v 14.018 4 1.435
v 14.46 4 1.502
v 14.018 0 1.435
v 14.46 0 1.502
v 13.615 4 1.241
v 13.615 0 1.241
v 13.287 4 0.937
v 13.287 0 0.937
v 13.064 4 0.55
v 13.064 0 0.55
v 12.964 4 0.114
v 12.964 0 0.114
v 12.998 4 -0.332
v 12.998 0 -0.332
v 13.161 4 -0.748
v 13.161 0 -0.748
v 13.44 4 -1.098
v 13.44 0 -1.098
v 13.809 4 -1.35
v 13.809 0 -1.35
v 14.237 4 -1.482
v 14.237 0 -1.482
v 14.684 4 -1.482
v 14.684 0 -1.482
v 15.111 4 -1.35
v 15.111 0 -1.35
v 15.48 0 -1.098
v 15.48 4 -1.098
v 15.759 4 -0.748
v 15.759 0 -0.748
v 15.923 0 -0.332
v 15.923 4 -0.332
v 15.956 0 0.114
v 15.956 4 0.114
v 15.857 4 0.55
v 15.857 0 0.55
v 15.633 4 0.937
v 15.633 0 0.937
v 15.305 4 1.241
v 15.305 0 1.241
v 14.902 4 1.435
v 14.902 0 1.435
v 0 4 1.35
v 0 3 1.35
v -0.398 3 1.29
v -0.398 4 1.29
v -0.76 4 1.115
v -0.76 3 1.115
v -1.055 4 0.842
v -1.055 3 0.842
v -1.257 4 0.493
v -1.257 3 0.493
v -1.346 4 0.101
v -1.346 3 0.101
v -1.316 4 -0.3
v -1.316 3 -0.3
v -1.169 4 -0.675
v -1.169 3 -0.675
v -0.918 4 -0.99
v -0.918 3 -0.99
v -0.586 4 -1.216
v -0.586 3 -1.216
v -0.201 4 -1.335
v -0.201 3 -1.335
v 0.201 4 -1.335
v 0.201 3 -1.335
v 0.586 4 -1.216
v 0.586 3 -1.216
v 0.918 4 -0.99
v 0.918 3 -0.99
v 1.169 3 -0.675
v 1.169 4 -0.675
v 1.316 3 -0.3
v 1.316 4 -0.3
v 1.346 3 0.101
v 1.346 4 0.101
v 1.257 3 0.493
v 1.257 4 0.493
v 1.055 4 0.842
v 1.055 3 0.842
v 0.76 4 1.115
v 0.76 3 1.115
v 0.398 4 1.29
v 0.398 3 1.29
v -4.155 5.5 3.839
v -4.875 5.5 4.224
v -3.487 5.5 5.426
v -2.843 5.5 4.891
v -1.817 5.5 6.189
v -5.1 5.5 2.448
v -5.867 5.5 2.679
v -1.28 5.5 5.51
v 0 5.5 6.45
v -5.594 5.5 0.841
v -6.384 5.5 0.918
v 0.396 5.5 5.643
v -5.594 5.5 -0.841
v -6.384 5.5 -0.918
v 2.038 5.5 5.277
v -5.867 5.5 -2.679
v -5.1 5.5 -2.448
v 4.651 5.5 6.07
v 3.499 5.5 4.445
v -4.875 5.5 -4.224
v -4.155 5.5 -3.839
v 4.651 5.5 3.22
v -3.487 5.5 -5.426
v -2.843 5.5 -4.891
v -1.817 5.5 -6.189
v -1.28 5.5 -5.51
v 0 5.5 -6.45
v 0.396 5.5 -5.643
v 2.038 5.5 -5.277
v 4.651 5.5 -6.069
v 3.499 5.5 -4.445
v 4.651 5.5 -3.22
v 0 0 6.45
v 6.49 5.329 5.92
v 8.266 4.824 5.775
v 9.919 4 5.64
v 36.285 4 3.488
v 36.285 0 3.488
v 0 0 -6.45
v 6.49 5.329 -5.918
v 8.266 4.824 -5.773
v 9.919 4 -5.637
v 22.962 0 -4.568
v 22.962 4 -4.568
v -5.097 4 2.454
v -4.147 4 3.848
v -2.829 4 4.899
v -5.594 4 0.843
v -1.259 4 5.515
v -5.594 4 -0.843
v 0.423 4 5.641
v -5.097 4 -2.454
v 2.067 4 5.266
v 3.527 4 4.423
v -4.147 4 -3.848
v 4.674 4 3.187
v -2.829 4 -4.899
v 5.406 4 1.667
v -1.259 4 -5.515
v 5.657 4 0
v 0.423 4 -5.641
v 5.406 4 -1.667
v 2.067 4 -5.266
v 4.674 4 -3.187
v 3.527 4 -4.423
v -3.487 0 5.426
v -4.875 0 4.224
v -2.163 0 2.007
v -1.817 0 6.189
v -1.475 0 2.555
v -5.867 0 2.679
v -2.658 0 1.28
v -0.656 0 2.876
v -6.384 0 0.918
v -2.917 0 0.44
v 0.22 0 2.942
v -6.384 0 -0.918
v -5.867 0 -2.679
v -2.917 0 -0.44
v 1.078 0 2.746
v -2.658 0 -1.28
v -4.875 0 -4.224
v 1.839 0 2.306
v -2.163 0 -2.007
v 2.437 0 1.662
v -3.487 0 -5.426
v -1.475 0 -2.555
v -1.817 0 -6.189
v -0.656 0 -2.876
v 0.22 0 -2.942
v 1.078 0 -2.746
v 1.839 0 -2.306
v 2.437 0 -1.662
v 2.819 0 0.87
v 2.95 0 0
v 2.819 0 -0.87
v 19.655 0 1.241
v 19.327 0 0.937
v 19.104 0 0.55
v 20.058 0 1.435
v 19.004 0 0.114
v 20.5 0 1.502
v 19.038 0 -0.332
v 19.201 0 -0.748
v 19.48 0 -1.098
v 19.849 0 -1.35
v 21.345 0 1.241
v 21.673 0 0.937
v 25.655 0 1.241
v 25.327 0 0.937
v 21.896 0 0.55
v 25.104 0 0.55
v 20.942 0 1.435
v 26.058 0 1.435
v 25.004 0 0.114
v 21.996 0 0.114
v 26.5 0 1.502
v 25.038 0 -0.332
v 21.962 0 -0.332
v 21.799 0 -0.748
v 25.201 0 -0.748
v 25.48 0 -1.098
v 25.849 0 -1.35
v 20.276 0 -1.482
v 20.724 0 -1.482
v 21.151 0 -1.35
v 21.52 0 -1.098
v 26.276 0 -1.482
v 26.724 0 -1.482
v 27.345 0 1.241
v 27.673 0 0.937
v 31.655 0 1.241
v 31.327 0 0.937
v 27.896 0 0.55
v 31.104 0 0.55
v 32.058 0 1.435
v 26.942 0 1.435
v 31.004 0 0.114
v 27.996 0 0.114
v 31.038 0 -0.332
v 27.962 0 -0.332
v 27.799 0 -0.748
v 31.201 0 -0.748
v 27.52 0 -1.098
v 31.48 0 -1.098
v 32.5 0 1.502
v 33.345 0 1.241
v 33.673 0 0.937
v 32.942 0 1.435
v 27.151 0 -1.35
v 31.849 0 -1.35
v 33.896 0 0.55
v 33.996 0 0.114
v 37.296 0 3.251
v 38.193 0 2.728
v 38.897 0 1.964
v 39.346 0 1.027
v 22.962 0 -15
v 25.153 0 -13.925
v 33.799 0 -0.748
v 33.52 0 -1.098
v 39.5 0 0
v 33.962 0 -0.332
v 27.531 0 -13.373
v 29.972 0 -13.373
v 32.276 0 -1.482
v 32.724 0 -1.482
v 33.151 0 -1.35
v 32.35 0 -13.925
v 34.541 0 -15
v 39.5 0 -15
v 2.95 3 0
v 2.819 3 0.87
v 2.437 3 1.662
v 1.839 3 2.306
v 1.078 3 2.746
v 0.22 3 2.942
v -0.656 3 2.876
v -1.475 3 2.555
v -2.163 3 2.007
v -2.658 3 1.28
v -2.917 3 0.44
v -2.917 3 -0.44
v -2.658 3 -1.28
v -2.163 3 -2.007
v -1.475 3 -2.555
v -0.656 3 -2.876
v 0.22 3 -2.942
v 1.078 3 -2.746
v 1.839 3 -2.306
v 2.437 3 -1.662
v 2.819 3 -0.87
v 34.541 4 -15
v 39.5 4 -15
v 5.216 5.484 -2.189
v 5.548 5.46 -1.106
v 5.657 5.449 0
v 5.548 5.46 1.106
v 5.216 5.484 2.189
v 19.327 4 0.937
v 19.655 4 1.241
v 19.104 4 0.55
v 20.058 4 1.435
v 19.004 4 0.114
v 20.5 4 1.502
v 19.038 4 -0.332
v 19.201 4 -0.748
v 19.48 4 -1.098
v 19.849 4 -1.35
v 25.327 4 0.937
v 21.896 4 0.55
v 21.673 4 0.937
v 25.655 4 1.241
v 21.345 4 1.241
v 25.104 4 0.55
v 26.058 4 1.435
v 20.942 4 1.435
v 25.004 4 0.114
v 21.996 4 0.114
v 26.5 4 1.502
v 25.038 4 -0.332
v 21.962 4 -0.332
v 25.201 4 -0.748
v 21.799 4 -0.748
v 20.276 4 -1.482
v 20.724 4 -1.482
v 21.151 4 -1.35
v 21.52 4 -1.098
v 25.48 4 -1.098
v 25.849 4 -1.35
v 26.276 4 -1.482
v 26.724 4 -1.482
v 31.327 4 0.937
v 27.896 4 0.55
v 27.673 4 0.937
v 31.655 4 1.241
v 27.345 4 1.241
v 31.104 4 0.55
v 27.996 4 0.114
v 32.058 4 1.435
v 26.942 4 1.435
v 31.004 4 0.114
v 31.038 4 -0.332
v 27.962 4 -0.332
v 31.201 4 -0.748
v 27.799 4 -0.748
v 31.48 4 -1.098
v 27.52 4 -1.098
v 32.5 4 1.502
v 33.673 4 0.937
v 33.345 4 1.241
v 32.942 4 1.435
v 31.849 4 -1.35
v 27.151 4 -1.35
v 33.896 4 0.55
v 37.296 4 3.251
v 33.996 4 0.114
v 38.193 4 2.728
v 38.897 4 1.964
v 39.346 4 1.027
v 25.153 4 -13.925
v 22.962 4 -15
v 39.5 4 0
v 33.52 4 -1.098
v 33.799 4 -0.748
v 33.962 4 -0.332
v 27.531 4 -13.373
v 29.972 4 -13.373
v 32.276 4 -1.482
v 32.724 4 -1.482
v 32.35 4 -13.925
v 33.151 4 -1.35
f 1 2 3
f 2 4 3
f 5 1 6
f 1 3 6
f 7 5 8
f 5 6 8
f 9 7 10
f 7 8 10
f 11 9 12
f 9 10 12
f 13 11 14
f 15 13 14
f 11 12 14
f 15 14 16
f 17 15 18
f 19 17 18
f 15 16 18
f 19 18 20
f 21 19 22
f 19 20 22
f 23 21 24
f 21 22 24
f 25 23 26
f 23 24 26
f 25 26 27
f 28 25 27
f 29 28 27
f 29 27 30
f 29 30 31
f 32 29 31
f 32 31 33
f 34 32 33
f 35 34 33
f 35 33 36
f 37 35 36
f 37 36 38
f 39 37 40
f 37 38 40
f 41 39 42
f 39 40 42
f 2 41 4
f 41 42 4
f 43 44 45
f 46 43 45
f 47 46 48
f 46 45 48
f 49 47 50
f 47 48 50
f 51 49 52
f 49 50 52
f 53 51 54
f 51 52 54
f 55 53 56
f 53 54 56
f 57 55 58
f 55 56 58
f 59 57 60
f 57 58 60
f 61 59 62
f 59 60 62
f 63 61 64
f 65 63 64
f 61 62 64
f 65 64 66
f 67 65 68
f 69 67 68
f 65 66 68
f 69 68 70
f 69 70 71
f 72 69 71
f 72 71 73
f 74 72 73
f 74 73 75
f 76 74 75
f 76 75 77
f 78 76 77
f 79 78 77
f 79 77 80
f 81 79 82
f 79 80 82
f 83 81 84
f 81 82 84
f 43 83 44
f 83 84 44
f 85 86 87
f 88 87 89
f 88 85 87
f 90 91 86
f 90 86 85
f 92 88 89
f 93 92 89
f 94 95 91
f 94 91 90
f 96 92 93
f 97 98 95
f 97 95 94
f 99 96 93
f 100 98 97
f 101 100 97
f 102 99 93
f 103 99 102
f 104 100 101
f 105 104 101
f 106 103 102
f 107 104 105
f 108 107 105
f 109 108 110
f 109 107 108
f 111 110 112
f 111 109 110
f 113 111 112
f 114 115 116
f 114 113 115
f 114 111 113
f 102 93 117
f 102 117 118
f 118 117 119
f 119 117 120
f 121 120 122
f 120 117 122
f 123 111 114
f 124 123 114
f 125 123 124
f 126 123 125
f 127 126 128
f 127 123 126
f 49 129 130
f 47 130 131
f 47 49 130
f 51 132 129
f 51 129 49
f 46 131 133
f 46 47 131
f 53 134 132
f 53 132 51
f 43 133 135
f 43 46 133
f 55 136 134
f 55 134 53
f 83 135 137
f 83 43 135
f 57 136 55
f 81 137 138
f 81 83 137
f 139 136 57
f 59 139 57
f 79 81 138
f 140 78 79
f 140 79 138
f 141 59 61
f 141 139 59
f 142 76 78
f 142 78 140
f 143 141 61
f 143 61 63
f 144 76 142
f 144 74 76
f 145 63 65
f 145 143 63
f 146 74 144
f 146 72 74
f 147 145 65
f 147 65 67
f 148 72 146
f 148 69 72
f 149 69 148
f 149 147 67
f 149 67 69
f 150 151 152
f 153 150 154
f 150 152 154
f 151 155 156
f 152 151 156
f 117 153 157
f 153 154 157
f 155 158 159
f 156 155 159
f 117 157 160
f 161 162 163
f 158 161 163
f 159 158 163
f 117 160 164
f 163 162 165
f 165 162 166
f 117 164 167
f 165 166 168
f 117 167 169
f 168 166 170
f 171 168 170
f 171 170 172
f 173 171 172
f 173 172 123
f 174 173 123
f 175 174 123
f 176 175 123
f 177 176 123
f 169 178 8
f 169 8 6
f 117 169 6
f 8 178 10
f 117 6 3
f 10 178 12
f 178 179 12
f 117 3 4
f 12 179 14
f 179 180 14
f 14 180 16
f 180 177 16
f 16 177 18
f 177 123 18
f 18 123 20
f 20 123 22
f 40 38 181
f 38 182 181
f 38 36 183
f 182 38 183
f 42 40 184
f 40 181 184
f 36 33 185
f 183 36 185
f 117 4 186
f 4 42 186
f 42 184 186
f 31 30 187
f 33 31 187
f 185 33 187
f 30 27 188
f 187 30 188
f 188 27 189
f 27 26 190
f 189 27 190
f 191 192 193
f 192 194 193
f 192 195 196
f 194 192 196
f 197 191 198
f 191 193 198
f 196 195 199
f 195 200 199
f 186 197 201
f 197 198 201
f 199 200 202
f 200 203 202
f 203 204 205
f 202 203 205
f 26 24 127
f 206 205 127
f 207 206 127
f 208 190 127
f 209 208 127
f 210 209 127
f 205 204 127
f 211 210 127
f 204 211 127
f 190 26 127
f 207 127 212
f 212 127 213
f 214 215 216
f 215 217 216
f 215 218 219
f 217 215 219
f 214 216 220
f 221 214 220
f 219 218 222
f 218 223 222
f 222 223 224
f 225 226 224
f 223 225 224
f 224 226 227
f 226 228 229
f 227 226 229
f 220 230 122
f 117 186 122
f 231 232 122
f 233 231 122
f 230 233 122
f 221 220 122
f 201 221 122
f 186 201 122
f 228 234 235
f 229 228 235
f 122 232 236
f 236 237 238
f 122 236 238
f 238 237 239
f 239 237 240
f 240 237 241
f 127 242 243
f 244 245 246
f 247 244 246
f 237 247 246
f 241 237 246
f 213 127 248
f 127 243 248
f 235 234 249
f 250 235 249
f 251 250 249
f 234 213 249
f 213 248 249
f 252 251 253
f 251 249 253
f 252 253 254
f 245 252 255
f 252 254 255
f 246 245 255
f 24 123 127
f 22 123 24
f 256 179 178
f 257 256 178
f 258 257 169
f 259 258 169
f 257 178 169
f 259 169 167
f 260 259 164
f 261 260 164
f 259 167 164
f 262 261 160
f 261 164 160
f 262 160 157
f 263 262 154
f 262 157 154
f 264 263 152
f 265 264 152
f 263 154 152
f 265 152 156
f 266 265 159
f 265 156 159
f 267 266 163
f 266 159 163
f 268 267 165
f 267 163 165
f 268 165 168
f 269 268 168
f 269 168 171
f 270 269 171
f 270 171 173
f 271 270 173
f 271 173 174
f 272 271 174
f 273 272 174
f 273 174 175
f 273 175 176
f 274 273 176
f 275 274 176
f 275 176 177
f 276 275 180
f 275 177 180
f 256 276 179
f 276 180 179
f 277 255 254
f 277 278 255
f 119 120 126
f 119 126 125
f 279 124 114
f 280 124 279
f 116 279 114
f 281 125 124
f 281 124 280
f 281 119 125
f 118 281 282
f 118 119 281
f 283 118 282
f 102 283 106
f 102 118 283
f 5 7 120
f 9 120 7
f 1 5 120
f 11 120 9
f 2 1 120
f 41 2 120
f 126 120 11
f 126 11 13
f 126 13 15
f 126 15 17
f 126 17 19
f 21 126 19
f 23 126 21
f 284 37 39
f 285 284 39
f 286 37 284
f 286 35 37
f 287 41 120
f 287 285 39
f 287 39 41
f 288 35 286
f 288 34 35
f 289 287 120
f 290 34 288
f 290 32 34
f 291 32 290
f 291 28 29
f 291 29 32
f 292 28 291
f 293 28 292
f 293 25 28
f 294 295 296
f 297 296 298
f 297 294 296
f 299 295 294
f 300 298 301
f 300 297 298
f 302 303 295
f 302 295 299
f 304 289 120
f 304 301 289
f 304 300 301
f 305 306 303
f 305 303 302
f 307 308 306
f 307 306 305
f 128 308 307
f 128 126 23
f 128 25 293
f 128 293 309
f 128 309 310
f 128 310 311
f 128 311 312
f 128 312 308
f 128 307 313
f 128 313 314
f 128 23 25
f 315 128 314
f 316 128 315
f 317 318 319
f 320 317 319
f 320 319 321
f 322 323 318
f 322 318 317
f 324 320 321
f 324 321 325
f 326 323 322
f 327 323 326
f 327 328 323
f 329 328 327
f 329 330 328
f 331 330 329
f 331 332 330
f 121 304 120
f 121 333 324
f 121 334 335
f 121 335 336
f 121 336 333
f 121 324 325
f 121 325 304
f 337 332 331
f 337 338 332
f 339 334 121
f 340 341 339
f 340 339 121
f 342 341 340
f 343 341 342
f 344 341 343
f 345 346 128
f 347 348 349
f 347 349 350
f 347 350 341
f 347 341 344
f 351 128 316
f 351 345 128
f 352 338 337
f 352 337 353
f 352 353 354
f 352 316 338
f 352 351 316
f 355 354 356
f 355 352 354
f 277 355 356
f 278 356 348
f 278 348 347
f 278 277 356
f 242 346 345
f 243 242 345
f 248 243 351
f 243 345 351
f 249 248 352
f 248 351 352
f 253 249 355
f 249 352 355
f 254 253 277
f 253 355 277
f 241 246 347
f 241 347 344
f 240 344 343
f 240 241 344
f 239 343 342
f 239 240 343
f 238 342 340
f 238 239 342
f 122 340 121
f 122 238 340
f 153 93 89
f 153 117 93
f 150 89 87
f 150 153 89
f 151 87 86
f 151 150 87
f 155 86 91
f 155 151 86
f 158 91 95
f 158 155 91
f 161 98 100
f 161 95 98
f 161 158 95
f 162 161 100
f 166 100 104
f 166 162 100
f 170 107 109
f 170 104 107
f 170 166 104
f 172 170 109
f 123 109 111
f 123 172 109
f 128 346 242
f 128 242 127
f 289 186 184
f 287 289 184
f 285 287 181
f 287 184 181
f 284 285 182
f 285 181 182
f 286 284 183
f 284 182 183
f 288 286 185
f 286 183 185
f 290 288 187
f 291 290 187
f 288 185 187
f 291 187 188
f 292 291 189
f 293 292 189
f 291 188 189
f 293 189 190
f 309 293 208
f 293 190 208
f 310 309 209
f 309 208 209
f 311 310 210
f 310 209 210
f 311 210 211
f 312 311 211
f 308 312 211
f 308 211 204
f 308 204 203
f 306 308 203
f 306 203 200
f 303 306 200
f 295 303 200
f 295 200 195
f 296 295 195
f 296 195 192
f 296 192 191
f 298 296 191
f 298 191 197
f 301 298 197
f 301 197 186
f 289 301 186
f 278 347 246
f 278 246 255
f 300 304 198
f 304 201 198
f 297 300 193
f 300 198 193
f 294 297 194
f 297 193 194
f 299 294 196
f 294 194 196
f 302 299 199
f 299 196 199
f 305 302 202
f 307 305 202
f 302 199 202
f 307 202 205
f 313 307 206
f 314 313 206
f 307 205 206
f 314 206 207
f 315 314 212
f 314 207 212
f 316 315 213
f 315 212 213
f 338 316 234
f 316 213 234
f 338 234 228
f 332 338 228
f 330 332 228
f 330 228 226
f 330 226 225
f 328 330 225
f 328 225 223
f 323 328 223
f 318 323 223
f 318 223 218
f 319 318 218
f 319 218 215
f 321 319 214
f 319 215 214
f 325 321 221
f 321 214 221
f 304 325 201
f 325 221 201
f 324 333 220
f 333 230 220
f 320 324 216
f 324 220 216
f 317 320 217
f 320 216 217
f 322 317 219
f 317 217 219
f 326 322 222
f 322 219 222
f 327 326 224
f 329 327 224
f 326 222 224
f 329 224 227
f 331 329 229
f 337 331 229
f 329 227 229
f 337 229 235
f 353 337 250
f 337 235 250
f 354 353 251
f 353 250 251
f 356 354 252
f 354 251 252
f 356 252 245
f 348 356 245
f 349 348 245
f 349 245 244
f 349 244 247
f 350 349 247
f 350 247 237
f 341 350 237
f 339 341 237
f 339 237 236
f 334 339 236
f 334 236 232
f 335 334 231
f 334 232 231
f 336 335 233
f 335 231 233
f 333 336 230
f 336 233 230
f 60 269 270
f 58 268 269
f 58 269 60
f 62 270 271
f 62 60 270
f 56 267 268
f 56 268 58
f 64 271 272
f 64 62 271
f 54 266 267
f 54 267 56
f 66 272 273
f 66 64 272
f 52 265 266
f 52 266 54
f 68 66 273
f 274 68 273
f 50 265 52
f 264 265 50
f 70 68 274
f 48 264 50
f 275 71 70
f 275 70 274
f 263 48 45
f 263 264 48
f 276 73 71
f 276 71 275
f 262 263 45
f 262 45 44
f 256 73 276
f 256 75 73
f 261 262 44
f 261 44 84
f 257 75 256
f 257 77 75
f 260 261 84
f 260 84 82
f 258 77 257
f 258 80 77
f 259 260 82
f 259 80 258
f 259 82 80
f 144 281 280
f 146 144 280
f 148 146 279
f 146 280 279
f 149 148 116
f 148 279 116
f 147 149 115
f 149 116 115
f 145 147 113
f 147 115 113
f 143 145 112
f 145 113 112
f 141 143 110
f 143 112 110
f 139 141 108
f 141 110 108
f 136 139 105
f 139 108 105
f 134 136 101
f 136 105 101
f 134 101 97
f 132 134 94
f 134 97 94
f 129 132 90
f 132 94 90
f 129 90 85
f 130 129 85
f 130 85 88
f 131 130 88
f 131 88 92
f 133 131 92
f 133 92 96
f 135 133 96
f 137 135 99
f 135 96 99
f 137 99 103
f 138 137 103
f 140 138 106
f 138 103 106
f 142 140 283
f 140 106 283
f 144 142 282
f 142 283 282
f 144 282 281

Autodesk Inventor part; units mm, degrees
ref_plane "YZ Plane" through (0, 0, 0) normal (1, 0, 0) x (0, 1, 0)
ref_plane "XZ Plane" through (0, 0, 0) normal (0, 1, 0) x (-1, 0, 0)
ref_plane "XY Plane" through (0, 0, 0) normal (0, 0, 1) x (1, 0, 0)
sketch "Sketch1" plane through (0, 0, 0) normal (0, 1, 0) x (-1, 0, 0)
  circle A0 centre (0, 0) radius 6.45
  circle A1 centre (0, 0) radius 5.657
  circle A2 centre (0, 0) radius 2.85
  line L0 (0, 0) -> (-36, 0) construction
  circle A3 centre (-36, 0) radius 3.5
  line L1 (0, -6.45) -> (-36, -3.5)
  line L2 (0, 6.45) -> (-36.2847, 3.4884)
  dimension "d0" = 12.9
  dimension "d1" = 11.314
  dimension "d2" = 5.7
  dimension "d3" = 36
  dimension "d4" = 7
extrude "Extrusion1" add sketch "Sketch1" along normal blind 4 contours A0 L1 L2 | A0 L1 A3 L2 | A3 | A1 | A2
sketch "Sketch2" plane through (0, 4, 0) normal (0, 1, 0) x (1, 0, 0)
  circle A0 centre (0, 0) radius 6.45
  line L0 (36, 3.5) -> (0, 6.45) projected
  line L1 (0, -6.45) -> (36.2847, -3.4884) projected
  arc A1 (0, 6.45) -> (0, -6.45) centre (0, 0) ccw
  line L2 (9.9188, -5.6404) -> (9.9188, 5.6372)
  line L3 (9.9188, 5.6372) -> (0, 6.45)
  line L4 (0, -6.45) -> (9.9188, -5.6404)
  dimension "d7" = 12.9
extrude "Extrusion2" add sketch "Sketch2" along normal blind 1.5 contours L0 A0 L1 | L0 L2 L1 A0
fillet "Fillet1" radius 10 1 edges at (9.9188, 5.5, 0.0016)
sketch "Sketch3" plane through (0, 5.5, 0) normal (0, 1, 0) x (1, 0, 0)
  circle A0 centre (0, 0) radius 5.657
  dimension "d11" = 11.314
extrude "Extrusion3" cut sketch "Sketch3" against normal blind 1.5
sketch "Sketch4" plane through (0, 4, 0) normal (0, 1, 0) x (1, 0, 0)
  circle A0 centre (0, 0) radius 2.9
  dimension "d14" = 5.8
sketch "Sketch5" plane through (0, 0, 0) normal (0, -1, 0) x (1, 0, 0)
  circle A0 centre (0, 0) radius 2.95
  dimension "d15" = 5.9
extrude "Extrusion4" cut sketch "Sketch5" against normal blind 3
sketch "Sketch6" plane through (0, 4, 0) normal (0, 1, 0) x (1, 0, 0)
  circle A0 centre (0, 0) radius 1.35
  dimension "d18" = 2.7
hole "Hole1" at (0, 4, 0) direction (0, -1, 0) diameter 2.7 end through all
sketch "Sketch7" plane through (0, 0, 0) normal (0, -1, 0) x (1, 0, 0)
  point P0 (0, 0)
sketch "Sketch8" plane through (0, 4, 0) normal (0, 1, 0) x (1, 0, 0)
  line L0 (9.9188, 5.6372) -> (9.9188, -5.6404) construction
  line L1 (9.9188, -0.0016) -> (39.5, -0.0016) construction
  arc A0 (36.2847, -3.4884) -> (36, 3.5) centre (36, 0) ccw construction
  line L2 (32.5, -0.0016) -> (26.5, -0.0016) construction
  circle A1 centre (26.5, -0.0016) radius 1.5 construction
  line L3 (26.5, -0.0016) -> (20.5, -0.0016) construction
  circle A2 centre (20.5, -0.0016) radius 1.5 construction
  circle A3 centre (32.5, -0.0016) radius 1.5 construction
  circle A4 centre (32.5, -0.0016) radius 1.5 construction
  circle A5 centre (32.5, -0.0016) radius 1.5
  circle A6 centre (26.5, -0.0016) radius 1.5
  circle A7 centre (20.5, -0.0016) radius 1.5
  point P0 (0, 0)
  dimension "d27" = 6
  dimension "d28" = 3
  dimension "d29" = 6
  dimension "d30" = 3
  dimension "d31" = 3
  dimension "d32" = 3
  dimension "d33" = 3
  dimension "d34" = 3
hole "Hole2" at (20.5, 4, 0.0016) at (26.5, 4, 0.0016) at (32.5, 4, 0.0016) direction (0, -1, 0) diameter 3 end through all
sketch "Sketch9" plane through (0, 4, 0) normal (0, 1, 0) x (1, 0, 0)
  arc A0 (36.2847, -3.4884) -> (36, 3.5) centre (36, 0) ccw projected
  line L0 (39.5, 0) -> (39.5, 15)
  line L1 (39.5, 15) -> (22.9619, 15)
  line L2 (22.9619, 15) -> (22.9619, 4.5684)
  line L3 (36, 3.5) -> (0, 6.45) projected
  point P0 (0, 0)
  dimension "d46" = 15
extrude "Extrusion5" add sketch "Sketch9" against normal blind 4
sketch "Sketch10" plane through (0, 4, 0) normal (0, 1, 0) x (1, 0, 0)
  line L0 (39.5, 15) -> (22.9619, 15)
  line L1 (22.9619, 15) -> (39.5, 15) projected
  line L2 (22.9619, 15) -> (39.5, 15) projected
  arc A0 (23.6935, 15) -> (35.6591, 15) centre (29.6763, 28.5077) ccw
  point P0 (0, 0)
extrude "Extrusion6" [suppressed]
sketch "Sketch11" plane through (0, 4, 0) normal (0, 1, 0) x (1, 0, 0)
  circle A0 centre (20.5, -0.0016) radius 1.5 construction
  line L0 (19, -0.0016) -> (16, -0.0016) construction
  circle A1 centre (14.4602, -0.0016) radius 1.5 construction
  circle A2 centre (14.4602, -0.0016) radius 1.5
  point P0 (0, 0)
  dimension "d47" = 3
  dimension "d48" = 3
hole "Hole3" at (14.4602, 4, 0.0016) direction (0, -1, 0) diameter 3 end through all
sketch "Sketch12" plane through (0, 4, 0) normal (0, 1, 0) x (1, 0, 0)
  line L0 (39.5, 15) -> (22.9619, 15)
  line L1 (22.9619, 15) -> (39.5, 15) projected
  arc A0 (22.9619, 15) -> (34.5413, 15) centre (28.7516, 24.0306) ccw
  point P0 (0, 0)
extrude "Extrusion7" cut sketch "Sketch12" against normal blind 4
properties part number "servo_arm_3"
